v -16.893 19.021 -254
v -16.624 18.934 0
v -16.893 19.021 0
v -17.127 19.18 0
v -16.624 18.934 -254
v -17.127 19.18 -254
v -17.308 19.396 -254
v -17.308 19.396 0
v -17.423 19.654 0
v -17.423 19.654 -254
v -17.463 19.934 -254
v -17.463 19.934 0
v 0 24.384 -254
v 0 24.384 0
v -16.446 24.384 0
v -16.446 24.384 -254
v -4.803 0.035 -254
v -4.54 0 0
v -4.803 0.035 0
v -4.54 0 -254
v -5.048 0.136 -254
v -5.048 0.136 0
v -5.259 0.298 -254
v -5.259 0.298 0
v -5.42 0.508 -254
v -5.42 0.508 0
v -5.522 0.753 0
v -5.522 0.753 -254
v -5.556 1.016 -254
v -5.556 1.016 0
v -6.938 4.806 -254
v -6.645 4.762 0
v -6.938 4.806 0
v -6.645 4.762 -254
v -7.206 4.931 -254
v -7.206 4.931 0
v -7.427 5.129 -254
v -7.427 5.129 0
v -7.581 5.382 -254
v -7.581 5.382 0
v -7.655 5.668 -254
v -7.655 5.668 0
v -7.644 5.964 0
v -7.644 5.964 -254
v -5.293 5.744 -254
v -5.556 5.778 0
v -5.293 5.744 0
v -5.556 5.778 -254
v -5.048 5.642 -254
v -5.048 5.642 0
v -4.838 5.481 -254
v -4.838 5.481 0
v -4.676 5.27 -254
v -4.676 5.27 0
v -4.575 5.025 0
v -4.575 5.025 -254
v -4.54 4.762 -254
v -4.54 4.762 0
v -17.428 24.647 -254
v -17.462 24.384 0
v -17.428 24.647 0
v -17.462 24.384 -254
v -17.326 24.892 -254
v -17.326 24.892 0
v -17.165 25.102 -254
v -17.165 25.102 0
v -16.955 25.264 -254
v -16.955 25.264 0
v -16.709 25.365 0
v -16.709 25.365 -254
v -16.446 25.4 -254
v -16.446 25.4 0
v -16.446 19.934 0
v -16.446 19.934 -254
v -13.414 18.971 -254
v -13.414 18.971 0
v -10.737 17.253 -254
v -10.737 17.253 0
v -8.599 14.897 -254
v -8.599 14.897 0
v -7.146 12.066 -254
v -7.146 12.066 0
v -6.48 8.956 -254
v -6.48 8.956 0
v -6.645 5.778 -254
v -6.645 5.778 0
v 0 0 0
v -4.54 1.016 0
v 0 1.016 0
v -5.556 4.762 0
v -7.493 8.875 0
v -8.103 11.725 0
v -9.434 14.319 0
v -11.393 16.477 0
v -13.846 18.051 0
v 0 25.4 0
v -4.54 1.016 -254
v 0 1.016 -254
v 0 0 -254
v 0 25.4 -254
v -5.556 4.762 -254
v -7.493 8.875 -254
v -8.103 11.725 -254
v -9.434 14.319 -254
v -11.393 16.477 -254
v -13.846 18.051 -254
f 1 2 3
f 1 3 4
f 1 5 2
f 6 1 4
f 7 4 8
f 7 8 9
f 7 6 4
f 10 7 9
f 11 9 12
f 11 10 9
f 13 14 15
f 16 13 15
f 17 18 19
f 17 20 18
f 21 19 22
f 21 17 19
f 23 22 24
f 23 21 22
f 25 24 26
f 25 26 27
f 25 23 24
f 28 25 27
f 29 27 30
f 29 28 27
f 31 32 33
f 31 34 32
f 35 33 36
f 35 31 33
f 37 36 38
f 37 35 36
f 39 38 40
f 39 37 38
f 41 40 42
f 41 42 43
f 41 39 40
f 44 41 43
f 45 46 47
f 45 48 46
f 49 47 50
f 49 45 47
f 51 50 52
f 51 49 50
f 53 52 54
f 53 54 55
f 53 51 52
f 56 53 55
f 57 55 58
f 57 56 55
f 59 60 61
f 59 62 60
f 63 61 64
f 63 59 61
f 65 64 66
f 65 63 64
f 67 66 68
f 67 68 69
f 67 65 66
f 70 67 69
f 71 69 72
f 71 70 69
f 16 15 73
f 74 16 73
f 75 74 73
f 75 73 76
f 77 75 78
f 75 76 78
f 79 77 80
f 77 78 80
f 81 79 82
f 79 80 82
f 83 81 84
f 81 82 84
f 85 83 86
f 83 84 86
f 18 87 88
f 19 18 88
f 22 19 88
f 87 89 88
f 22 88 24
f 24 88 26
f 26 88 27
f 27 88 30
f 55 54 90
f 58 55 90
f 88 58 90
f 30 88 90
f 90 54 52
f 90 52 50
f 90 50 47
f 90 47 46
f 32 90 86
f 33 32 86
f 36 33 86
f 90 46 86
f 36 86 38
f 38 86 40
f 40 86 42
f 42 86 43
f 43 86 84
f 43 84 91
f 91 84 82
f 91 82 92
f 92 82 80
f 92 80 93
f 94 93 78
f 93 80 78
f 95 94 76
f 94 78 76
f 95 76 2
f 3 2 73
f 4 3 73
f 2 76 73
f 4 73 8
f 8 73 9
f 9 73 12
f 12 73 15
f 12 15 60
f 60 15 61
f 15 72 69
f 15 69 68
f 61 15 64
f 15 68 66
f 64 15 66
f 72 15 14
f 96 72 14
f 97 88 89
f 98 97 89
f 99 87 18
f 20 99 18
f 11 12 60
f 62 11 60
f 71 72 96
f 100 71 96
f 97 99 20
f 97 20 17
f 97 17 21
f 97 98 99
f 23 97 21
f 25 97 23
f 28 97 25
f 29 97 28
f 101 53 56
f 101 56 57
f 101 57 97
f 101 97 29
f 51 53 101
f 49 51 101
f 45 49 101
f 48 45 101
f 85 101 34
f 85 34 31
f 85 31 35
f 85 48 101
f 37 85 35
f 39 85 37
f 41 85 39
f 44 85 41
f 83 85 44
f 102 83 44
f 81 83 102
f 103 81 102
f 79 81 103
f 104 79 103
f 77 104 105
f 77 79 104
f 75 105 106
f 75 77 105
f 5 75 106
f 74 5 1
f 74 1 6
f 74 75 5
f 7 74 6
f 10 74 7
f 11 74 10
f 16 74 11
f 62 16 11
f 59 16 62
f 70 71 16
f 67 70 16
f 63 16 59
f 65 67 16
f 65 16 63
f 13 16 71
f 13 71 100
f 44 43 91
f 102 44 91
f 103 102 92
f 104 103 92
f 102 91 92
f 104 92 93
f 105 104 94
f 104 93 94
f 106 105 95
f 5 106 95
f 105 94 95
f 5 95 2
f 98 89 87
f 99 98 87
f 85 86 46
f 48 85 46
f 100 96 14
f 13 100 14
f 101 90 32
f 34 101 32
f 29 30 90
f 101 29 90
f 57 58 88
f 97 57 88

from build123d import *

# Parameters (mm, degrees)
EXTRUDE_THIN1_DEPTH = 254
FILLET1_R           = 1.016


with BuildPart() as part:
    # Sketch1 → Extrude-Thin1 (new body)
    with BuildSketch(Plane.XY):
        with BuildLine():
            Line((0, 0), (-5.55625, 0))
            Line((-5.55625, 0), (-5.55625, 4.7625))
            Line((-5.55625, 4.7625), (-7.9375, 4.7625))
            ThreePointArc((-7.9375, 4.7625), (-9.323959524, 14.156943651), (-17.4625, 19.05))
            Line((-17.4625, 19.05), (-17.4625, 25.4))
            Line((-17.4625, 25.4), (0, 25.4))
            Line((0, 25.4), (0, 24.384))
            Line((0, 24.384), (-16.4465, 24.384))
            Line((-16.4465, 24.384), (-16.4465, 19.933974896))
            ThreePointArc((-16.4465, 19.933974896), (-8.598518146, 14.89701763), (-6.645470806, 5.7785))
            Line((-6.645470806, 5.7785), (-4.54025, 5.7785))
            Line((-4.54025, 5.7785), (-4.54025, 1.016))
            Line((-4.54025, 1.016), (0, 1.016))
            Line((0, 1.016), (0, 0))
        make_face()
    extrude(amount=-EXTRUDE_THIN1_DEPTH)

    # Fillet1
    fillet1_edges = [part.edges().sort_by_distance(p)[0] for p in [
        (-4.54025, 5.7785, -127),
        (-5.55625, 0, -127),
        (-7.9375, 4.7625, -127),
        (-17.4625, 19.05, -127),
        (-17.4625, 25.4, -127),
    ]]
    fillet(fillet1_edges, radius=FILLET1_R)


solid = part.part
